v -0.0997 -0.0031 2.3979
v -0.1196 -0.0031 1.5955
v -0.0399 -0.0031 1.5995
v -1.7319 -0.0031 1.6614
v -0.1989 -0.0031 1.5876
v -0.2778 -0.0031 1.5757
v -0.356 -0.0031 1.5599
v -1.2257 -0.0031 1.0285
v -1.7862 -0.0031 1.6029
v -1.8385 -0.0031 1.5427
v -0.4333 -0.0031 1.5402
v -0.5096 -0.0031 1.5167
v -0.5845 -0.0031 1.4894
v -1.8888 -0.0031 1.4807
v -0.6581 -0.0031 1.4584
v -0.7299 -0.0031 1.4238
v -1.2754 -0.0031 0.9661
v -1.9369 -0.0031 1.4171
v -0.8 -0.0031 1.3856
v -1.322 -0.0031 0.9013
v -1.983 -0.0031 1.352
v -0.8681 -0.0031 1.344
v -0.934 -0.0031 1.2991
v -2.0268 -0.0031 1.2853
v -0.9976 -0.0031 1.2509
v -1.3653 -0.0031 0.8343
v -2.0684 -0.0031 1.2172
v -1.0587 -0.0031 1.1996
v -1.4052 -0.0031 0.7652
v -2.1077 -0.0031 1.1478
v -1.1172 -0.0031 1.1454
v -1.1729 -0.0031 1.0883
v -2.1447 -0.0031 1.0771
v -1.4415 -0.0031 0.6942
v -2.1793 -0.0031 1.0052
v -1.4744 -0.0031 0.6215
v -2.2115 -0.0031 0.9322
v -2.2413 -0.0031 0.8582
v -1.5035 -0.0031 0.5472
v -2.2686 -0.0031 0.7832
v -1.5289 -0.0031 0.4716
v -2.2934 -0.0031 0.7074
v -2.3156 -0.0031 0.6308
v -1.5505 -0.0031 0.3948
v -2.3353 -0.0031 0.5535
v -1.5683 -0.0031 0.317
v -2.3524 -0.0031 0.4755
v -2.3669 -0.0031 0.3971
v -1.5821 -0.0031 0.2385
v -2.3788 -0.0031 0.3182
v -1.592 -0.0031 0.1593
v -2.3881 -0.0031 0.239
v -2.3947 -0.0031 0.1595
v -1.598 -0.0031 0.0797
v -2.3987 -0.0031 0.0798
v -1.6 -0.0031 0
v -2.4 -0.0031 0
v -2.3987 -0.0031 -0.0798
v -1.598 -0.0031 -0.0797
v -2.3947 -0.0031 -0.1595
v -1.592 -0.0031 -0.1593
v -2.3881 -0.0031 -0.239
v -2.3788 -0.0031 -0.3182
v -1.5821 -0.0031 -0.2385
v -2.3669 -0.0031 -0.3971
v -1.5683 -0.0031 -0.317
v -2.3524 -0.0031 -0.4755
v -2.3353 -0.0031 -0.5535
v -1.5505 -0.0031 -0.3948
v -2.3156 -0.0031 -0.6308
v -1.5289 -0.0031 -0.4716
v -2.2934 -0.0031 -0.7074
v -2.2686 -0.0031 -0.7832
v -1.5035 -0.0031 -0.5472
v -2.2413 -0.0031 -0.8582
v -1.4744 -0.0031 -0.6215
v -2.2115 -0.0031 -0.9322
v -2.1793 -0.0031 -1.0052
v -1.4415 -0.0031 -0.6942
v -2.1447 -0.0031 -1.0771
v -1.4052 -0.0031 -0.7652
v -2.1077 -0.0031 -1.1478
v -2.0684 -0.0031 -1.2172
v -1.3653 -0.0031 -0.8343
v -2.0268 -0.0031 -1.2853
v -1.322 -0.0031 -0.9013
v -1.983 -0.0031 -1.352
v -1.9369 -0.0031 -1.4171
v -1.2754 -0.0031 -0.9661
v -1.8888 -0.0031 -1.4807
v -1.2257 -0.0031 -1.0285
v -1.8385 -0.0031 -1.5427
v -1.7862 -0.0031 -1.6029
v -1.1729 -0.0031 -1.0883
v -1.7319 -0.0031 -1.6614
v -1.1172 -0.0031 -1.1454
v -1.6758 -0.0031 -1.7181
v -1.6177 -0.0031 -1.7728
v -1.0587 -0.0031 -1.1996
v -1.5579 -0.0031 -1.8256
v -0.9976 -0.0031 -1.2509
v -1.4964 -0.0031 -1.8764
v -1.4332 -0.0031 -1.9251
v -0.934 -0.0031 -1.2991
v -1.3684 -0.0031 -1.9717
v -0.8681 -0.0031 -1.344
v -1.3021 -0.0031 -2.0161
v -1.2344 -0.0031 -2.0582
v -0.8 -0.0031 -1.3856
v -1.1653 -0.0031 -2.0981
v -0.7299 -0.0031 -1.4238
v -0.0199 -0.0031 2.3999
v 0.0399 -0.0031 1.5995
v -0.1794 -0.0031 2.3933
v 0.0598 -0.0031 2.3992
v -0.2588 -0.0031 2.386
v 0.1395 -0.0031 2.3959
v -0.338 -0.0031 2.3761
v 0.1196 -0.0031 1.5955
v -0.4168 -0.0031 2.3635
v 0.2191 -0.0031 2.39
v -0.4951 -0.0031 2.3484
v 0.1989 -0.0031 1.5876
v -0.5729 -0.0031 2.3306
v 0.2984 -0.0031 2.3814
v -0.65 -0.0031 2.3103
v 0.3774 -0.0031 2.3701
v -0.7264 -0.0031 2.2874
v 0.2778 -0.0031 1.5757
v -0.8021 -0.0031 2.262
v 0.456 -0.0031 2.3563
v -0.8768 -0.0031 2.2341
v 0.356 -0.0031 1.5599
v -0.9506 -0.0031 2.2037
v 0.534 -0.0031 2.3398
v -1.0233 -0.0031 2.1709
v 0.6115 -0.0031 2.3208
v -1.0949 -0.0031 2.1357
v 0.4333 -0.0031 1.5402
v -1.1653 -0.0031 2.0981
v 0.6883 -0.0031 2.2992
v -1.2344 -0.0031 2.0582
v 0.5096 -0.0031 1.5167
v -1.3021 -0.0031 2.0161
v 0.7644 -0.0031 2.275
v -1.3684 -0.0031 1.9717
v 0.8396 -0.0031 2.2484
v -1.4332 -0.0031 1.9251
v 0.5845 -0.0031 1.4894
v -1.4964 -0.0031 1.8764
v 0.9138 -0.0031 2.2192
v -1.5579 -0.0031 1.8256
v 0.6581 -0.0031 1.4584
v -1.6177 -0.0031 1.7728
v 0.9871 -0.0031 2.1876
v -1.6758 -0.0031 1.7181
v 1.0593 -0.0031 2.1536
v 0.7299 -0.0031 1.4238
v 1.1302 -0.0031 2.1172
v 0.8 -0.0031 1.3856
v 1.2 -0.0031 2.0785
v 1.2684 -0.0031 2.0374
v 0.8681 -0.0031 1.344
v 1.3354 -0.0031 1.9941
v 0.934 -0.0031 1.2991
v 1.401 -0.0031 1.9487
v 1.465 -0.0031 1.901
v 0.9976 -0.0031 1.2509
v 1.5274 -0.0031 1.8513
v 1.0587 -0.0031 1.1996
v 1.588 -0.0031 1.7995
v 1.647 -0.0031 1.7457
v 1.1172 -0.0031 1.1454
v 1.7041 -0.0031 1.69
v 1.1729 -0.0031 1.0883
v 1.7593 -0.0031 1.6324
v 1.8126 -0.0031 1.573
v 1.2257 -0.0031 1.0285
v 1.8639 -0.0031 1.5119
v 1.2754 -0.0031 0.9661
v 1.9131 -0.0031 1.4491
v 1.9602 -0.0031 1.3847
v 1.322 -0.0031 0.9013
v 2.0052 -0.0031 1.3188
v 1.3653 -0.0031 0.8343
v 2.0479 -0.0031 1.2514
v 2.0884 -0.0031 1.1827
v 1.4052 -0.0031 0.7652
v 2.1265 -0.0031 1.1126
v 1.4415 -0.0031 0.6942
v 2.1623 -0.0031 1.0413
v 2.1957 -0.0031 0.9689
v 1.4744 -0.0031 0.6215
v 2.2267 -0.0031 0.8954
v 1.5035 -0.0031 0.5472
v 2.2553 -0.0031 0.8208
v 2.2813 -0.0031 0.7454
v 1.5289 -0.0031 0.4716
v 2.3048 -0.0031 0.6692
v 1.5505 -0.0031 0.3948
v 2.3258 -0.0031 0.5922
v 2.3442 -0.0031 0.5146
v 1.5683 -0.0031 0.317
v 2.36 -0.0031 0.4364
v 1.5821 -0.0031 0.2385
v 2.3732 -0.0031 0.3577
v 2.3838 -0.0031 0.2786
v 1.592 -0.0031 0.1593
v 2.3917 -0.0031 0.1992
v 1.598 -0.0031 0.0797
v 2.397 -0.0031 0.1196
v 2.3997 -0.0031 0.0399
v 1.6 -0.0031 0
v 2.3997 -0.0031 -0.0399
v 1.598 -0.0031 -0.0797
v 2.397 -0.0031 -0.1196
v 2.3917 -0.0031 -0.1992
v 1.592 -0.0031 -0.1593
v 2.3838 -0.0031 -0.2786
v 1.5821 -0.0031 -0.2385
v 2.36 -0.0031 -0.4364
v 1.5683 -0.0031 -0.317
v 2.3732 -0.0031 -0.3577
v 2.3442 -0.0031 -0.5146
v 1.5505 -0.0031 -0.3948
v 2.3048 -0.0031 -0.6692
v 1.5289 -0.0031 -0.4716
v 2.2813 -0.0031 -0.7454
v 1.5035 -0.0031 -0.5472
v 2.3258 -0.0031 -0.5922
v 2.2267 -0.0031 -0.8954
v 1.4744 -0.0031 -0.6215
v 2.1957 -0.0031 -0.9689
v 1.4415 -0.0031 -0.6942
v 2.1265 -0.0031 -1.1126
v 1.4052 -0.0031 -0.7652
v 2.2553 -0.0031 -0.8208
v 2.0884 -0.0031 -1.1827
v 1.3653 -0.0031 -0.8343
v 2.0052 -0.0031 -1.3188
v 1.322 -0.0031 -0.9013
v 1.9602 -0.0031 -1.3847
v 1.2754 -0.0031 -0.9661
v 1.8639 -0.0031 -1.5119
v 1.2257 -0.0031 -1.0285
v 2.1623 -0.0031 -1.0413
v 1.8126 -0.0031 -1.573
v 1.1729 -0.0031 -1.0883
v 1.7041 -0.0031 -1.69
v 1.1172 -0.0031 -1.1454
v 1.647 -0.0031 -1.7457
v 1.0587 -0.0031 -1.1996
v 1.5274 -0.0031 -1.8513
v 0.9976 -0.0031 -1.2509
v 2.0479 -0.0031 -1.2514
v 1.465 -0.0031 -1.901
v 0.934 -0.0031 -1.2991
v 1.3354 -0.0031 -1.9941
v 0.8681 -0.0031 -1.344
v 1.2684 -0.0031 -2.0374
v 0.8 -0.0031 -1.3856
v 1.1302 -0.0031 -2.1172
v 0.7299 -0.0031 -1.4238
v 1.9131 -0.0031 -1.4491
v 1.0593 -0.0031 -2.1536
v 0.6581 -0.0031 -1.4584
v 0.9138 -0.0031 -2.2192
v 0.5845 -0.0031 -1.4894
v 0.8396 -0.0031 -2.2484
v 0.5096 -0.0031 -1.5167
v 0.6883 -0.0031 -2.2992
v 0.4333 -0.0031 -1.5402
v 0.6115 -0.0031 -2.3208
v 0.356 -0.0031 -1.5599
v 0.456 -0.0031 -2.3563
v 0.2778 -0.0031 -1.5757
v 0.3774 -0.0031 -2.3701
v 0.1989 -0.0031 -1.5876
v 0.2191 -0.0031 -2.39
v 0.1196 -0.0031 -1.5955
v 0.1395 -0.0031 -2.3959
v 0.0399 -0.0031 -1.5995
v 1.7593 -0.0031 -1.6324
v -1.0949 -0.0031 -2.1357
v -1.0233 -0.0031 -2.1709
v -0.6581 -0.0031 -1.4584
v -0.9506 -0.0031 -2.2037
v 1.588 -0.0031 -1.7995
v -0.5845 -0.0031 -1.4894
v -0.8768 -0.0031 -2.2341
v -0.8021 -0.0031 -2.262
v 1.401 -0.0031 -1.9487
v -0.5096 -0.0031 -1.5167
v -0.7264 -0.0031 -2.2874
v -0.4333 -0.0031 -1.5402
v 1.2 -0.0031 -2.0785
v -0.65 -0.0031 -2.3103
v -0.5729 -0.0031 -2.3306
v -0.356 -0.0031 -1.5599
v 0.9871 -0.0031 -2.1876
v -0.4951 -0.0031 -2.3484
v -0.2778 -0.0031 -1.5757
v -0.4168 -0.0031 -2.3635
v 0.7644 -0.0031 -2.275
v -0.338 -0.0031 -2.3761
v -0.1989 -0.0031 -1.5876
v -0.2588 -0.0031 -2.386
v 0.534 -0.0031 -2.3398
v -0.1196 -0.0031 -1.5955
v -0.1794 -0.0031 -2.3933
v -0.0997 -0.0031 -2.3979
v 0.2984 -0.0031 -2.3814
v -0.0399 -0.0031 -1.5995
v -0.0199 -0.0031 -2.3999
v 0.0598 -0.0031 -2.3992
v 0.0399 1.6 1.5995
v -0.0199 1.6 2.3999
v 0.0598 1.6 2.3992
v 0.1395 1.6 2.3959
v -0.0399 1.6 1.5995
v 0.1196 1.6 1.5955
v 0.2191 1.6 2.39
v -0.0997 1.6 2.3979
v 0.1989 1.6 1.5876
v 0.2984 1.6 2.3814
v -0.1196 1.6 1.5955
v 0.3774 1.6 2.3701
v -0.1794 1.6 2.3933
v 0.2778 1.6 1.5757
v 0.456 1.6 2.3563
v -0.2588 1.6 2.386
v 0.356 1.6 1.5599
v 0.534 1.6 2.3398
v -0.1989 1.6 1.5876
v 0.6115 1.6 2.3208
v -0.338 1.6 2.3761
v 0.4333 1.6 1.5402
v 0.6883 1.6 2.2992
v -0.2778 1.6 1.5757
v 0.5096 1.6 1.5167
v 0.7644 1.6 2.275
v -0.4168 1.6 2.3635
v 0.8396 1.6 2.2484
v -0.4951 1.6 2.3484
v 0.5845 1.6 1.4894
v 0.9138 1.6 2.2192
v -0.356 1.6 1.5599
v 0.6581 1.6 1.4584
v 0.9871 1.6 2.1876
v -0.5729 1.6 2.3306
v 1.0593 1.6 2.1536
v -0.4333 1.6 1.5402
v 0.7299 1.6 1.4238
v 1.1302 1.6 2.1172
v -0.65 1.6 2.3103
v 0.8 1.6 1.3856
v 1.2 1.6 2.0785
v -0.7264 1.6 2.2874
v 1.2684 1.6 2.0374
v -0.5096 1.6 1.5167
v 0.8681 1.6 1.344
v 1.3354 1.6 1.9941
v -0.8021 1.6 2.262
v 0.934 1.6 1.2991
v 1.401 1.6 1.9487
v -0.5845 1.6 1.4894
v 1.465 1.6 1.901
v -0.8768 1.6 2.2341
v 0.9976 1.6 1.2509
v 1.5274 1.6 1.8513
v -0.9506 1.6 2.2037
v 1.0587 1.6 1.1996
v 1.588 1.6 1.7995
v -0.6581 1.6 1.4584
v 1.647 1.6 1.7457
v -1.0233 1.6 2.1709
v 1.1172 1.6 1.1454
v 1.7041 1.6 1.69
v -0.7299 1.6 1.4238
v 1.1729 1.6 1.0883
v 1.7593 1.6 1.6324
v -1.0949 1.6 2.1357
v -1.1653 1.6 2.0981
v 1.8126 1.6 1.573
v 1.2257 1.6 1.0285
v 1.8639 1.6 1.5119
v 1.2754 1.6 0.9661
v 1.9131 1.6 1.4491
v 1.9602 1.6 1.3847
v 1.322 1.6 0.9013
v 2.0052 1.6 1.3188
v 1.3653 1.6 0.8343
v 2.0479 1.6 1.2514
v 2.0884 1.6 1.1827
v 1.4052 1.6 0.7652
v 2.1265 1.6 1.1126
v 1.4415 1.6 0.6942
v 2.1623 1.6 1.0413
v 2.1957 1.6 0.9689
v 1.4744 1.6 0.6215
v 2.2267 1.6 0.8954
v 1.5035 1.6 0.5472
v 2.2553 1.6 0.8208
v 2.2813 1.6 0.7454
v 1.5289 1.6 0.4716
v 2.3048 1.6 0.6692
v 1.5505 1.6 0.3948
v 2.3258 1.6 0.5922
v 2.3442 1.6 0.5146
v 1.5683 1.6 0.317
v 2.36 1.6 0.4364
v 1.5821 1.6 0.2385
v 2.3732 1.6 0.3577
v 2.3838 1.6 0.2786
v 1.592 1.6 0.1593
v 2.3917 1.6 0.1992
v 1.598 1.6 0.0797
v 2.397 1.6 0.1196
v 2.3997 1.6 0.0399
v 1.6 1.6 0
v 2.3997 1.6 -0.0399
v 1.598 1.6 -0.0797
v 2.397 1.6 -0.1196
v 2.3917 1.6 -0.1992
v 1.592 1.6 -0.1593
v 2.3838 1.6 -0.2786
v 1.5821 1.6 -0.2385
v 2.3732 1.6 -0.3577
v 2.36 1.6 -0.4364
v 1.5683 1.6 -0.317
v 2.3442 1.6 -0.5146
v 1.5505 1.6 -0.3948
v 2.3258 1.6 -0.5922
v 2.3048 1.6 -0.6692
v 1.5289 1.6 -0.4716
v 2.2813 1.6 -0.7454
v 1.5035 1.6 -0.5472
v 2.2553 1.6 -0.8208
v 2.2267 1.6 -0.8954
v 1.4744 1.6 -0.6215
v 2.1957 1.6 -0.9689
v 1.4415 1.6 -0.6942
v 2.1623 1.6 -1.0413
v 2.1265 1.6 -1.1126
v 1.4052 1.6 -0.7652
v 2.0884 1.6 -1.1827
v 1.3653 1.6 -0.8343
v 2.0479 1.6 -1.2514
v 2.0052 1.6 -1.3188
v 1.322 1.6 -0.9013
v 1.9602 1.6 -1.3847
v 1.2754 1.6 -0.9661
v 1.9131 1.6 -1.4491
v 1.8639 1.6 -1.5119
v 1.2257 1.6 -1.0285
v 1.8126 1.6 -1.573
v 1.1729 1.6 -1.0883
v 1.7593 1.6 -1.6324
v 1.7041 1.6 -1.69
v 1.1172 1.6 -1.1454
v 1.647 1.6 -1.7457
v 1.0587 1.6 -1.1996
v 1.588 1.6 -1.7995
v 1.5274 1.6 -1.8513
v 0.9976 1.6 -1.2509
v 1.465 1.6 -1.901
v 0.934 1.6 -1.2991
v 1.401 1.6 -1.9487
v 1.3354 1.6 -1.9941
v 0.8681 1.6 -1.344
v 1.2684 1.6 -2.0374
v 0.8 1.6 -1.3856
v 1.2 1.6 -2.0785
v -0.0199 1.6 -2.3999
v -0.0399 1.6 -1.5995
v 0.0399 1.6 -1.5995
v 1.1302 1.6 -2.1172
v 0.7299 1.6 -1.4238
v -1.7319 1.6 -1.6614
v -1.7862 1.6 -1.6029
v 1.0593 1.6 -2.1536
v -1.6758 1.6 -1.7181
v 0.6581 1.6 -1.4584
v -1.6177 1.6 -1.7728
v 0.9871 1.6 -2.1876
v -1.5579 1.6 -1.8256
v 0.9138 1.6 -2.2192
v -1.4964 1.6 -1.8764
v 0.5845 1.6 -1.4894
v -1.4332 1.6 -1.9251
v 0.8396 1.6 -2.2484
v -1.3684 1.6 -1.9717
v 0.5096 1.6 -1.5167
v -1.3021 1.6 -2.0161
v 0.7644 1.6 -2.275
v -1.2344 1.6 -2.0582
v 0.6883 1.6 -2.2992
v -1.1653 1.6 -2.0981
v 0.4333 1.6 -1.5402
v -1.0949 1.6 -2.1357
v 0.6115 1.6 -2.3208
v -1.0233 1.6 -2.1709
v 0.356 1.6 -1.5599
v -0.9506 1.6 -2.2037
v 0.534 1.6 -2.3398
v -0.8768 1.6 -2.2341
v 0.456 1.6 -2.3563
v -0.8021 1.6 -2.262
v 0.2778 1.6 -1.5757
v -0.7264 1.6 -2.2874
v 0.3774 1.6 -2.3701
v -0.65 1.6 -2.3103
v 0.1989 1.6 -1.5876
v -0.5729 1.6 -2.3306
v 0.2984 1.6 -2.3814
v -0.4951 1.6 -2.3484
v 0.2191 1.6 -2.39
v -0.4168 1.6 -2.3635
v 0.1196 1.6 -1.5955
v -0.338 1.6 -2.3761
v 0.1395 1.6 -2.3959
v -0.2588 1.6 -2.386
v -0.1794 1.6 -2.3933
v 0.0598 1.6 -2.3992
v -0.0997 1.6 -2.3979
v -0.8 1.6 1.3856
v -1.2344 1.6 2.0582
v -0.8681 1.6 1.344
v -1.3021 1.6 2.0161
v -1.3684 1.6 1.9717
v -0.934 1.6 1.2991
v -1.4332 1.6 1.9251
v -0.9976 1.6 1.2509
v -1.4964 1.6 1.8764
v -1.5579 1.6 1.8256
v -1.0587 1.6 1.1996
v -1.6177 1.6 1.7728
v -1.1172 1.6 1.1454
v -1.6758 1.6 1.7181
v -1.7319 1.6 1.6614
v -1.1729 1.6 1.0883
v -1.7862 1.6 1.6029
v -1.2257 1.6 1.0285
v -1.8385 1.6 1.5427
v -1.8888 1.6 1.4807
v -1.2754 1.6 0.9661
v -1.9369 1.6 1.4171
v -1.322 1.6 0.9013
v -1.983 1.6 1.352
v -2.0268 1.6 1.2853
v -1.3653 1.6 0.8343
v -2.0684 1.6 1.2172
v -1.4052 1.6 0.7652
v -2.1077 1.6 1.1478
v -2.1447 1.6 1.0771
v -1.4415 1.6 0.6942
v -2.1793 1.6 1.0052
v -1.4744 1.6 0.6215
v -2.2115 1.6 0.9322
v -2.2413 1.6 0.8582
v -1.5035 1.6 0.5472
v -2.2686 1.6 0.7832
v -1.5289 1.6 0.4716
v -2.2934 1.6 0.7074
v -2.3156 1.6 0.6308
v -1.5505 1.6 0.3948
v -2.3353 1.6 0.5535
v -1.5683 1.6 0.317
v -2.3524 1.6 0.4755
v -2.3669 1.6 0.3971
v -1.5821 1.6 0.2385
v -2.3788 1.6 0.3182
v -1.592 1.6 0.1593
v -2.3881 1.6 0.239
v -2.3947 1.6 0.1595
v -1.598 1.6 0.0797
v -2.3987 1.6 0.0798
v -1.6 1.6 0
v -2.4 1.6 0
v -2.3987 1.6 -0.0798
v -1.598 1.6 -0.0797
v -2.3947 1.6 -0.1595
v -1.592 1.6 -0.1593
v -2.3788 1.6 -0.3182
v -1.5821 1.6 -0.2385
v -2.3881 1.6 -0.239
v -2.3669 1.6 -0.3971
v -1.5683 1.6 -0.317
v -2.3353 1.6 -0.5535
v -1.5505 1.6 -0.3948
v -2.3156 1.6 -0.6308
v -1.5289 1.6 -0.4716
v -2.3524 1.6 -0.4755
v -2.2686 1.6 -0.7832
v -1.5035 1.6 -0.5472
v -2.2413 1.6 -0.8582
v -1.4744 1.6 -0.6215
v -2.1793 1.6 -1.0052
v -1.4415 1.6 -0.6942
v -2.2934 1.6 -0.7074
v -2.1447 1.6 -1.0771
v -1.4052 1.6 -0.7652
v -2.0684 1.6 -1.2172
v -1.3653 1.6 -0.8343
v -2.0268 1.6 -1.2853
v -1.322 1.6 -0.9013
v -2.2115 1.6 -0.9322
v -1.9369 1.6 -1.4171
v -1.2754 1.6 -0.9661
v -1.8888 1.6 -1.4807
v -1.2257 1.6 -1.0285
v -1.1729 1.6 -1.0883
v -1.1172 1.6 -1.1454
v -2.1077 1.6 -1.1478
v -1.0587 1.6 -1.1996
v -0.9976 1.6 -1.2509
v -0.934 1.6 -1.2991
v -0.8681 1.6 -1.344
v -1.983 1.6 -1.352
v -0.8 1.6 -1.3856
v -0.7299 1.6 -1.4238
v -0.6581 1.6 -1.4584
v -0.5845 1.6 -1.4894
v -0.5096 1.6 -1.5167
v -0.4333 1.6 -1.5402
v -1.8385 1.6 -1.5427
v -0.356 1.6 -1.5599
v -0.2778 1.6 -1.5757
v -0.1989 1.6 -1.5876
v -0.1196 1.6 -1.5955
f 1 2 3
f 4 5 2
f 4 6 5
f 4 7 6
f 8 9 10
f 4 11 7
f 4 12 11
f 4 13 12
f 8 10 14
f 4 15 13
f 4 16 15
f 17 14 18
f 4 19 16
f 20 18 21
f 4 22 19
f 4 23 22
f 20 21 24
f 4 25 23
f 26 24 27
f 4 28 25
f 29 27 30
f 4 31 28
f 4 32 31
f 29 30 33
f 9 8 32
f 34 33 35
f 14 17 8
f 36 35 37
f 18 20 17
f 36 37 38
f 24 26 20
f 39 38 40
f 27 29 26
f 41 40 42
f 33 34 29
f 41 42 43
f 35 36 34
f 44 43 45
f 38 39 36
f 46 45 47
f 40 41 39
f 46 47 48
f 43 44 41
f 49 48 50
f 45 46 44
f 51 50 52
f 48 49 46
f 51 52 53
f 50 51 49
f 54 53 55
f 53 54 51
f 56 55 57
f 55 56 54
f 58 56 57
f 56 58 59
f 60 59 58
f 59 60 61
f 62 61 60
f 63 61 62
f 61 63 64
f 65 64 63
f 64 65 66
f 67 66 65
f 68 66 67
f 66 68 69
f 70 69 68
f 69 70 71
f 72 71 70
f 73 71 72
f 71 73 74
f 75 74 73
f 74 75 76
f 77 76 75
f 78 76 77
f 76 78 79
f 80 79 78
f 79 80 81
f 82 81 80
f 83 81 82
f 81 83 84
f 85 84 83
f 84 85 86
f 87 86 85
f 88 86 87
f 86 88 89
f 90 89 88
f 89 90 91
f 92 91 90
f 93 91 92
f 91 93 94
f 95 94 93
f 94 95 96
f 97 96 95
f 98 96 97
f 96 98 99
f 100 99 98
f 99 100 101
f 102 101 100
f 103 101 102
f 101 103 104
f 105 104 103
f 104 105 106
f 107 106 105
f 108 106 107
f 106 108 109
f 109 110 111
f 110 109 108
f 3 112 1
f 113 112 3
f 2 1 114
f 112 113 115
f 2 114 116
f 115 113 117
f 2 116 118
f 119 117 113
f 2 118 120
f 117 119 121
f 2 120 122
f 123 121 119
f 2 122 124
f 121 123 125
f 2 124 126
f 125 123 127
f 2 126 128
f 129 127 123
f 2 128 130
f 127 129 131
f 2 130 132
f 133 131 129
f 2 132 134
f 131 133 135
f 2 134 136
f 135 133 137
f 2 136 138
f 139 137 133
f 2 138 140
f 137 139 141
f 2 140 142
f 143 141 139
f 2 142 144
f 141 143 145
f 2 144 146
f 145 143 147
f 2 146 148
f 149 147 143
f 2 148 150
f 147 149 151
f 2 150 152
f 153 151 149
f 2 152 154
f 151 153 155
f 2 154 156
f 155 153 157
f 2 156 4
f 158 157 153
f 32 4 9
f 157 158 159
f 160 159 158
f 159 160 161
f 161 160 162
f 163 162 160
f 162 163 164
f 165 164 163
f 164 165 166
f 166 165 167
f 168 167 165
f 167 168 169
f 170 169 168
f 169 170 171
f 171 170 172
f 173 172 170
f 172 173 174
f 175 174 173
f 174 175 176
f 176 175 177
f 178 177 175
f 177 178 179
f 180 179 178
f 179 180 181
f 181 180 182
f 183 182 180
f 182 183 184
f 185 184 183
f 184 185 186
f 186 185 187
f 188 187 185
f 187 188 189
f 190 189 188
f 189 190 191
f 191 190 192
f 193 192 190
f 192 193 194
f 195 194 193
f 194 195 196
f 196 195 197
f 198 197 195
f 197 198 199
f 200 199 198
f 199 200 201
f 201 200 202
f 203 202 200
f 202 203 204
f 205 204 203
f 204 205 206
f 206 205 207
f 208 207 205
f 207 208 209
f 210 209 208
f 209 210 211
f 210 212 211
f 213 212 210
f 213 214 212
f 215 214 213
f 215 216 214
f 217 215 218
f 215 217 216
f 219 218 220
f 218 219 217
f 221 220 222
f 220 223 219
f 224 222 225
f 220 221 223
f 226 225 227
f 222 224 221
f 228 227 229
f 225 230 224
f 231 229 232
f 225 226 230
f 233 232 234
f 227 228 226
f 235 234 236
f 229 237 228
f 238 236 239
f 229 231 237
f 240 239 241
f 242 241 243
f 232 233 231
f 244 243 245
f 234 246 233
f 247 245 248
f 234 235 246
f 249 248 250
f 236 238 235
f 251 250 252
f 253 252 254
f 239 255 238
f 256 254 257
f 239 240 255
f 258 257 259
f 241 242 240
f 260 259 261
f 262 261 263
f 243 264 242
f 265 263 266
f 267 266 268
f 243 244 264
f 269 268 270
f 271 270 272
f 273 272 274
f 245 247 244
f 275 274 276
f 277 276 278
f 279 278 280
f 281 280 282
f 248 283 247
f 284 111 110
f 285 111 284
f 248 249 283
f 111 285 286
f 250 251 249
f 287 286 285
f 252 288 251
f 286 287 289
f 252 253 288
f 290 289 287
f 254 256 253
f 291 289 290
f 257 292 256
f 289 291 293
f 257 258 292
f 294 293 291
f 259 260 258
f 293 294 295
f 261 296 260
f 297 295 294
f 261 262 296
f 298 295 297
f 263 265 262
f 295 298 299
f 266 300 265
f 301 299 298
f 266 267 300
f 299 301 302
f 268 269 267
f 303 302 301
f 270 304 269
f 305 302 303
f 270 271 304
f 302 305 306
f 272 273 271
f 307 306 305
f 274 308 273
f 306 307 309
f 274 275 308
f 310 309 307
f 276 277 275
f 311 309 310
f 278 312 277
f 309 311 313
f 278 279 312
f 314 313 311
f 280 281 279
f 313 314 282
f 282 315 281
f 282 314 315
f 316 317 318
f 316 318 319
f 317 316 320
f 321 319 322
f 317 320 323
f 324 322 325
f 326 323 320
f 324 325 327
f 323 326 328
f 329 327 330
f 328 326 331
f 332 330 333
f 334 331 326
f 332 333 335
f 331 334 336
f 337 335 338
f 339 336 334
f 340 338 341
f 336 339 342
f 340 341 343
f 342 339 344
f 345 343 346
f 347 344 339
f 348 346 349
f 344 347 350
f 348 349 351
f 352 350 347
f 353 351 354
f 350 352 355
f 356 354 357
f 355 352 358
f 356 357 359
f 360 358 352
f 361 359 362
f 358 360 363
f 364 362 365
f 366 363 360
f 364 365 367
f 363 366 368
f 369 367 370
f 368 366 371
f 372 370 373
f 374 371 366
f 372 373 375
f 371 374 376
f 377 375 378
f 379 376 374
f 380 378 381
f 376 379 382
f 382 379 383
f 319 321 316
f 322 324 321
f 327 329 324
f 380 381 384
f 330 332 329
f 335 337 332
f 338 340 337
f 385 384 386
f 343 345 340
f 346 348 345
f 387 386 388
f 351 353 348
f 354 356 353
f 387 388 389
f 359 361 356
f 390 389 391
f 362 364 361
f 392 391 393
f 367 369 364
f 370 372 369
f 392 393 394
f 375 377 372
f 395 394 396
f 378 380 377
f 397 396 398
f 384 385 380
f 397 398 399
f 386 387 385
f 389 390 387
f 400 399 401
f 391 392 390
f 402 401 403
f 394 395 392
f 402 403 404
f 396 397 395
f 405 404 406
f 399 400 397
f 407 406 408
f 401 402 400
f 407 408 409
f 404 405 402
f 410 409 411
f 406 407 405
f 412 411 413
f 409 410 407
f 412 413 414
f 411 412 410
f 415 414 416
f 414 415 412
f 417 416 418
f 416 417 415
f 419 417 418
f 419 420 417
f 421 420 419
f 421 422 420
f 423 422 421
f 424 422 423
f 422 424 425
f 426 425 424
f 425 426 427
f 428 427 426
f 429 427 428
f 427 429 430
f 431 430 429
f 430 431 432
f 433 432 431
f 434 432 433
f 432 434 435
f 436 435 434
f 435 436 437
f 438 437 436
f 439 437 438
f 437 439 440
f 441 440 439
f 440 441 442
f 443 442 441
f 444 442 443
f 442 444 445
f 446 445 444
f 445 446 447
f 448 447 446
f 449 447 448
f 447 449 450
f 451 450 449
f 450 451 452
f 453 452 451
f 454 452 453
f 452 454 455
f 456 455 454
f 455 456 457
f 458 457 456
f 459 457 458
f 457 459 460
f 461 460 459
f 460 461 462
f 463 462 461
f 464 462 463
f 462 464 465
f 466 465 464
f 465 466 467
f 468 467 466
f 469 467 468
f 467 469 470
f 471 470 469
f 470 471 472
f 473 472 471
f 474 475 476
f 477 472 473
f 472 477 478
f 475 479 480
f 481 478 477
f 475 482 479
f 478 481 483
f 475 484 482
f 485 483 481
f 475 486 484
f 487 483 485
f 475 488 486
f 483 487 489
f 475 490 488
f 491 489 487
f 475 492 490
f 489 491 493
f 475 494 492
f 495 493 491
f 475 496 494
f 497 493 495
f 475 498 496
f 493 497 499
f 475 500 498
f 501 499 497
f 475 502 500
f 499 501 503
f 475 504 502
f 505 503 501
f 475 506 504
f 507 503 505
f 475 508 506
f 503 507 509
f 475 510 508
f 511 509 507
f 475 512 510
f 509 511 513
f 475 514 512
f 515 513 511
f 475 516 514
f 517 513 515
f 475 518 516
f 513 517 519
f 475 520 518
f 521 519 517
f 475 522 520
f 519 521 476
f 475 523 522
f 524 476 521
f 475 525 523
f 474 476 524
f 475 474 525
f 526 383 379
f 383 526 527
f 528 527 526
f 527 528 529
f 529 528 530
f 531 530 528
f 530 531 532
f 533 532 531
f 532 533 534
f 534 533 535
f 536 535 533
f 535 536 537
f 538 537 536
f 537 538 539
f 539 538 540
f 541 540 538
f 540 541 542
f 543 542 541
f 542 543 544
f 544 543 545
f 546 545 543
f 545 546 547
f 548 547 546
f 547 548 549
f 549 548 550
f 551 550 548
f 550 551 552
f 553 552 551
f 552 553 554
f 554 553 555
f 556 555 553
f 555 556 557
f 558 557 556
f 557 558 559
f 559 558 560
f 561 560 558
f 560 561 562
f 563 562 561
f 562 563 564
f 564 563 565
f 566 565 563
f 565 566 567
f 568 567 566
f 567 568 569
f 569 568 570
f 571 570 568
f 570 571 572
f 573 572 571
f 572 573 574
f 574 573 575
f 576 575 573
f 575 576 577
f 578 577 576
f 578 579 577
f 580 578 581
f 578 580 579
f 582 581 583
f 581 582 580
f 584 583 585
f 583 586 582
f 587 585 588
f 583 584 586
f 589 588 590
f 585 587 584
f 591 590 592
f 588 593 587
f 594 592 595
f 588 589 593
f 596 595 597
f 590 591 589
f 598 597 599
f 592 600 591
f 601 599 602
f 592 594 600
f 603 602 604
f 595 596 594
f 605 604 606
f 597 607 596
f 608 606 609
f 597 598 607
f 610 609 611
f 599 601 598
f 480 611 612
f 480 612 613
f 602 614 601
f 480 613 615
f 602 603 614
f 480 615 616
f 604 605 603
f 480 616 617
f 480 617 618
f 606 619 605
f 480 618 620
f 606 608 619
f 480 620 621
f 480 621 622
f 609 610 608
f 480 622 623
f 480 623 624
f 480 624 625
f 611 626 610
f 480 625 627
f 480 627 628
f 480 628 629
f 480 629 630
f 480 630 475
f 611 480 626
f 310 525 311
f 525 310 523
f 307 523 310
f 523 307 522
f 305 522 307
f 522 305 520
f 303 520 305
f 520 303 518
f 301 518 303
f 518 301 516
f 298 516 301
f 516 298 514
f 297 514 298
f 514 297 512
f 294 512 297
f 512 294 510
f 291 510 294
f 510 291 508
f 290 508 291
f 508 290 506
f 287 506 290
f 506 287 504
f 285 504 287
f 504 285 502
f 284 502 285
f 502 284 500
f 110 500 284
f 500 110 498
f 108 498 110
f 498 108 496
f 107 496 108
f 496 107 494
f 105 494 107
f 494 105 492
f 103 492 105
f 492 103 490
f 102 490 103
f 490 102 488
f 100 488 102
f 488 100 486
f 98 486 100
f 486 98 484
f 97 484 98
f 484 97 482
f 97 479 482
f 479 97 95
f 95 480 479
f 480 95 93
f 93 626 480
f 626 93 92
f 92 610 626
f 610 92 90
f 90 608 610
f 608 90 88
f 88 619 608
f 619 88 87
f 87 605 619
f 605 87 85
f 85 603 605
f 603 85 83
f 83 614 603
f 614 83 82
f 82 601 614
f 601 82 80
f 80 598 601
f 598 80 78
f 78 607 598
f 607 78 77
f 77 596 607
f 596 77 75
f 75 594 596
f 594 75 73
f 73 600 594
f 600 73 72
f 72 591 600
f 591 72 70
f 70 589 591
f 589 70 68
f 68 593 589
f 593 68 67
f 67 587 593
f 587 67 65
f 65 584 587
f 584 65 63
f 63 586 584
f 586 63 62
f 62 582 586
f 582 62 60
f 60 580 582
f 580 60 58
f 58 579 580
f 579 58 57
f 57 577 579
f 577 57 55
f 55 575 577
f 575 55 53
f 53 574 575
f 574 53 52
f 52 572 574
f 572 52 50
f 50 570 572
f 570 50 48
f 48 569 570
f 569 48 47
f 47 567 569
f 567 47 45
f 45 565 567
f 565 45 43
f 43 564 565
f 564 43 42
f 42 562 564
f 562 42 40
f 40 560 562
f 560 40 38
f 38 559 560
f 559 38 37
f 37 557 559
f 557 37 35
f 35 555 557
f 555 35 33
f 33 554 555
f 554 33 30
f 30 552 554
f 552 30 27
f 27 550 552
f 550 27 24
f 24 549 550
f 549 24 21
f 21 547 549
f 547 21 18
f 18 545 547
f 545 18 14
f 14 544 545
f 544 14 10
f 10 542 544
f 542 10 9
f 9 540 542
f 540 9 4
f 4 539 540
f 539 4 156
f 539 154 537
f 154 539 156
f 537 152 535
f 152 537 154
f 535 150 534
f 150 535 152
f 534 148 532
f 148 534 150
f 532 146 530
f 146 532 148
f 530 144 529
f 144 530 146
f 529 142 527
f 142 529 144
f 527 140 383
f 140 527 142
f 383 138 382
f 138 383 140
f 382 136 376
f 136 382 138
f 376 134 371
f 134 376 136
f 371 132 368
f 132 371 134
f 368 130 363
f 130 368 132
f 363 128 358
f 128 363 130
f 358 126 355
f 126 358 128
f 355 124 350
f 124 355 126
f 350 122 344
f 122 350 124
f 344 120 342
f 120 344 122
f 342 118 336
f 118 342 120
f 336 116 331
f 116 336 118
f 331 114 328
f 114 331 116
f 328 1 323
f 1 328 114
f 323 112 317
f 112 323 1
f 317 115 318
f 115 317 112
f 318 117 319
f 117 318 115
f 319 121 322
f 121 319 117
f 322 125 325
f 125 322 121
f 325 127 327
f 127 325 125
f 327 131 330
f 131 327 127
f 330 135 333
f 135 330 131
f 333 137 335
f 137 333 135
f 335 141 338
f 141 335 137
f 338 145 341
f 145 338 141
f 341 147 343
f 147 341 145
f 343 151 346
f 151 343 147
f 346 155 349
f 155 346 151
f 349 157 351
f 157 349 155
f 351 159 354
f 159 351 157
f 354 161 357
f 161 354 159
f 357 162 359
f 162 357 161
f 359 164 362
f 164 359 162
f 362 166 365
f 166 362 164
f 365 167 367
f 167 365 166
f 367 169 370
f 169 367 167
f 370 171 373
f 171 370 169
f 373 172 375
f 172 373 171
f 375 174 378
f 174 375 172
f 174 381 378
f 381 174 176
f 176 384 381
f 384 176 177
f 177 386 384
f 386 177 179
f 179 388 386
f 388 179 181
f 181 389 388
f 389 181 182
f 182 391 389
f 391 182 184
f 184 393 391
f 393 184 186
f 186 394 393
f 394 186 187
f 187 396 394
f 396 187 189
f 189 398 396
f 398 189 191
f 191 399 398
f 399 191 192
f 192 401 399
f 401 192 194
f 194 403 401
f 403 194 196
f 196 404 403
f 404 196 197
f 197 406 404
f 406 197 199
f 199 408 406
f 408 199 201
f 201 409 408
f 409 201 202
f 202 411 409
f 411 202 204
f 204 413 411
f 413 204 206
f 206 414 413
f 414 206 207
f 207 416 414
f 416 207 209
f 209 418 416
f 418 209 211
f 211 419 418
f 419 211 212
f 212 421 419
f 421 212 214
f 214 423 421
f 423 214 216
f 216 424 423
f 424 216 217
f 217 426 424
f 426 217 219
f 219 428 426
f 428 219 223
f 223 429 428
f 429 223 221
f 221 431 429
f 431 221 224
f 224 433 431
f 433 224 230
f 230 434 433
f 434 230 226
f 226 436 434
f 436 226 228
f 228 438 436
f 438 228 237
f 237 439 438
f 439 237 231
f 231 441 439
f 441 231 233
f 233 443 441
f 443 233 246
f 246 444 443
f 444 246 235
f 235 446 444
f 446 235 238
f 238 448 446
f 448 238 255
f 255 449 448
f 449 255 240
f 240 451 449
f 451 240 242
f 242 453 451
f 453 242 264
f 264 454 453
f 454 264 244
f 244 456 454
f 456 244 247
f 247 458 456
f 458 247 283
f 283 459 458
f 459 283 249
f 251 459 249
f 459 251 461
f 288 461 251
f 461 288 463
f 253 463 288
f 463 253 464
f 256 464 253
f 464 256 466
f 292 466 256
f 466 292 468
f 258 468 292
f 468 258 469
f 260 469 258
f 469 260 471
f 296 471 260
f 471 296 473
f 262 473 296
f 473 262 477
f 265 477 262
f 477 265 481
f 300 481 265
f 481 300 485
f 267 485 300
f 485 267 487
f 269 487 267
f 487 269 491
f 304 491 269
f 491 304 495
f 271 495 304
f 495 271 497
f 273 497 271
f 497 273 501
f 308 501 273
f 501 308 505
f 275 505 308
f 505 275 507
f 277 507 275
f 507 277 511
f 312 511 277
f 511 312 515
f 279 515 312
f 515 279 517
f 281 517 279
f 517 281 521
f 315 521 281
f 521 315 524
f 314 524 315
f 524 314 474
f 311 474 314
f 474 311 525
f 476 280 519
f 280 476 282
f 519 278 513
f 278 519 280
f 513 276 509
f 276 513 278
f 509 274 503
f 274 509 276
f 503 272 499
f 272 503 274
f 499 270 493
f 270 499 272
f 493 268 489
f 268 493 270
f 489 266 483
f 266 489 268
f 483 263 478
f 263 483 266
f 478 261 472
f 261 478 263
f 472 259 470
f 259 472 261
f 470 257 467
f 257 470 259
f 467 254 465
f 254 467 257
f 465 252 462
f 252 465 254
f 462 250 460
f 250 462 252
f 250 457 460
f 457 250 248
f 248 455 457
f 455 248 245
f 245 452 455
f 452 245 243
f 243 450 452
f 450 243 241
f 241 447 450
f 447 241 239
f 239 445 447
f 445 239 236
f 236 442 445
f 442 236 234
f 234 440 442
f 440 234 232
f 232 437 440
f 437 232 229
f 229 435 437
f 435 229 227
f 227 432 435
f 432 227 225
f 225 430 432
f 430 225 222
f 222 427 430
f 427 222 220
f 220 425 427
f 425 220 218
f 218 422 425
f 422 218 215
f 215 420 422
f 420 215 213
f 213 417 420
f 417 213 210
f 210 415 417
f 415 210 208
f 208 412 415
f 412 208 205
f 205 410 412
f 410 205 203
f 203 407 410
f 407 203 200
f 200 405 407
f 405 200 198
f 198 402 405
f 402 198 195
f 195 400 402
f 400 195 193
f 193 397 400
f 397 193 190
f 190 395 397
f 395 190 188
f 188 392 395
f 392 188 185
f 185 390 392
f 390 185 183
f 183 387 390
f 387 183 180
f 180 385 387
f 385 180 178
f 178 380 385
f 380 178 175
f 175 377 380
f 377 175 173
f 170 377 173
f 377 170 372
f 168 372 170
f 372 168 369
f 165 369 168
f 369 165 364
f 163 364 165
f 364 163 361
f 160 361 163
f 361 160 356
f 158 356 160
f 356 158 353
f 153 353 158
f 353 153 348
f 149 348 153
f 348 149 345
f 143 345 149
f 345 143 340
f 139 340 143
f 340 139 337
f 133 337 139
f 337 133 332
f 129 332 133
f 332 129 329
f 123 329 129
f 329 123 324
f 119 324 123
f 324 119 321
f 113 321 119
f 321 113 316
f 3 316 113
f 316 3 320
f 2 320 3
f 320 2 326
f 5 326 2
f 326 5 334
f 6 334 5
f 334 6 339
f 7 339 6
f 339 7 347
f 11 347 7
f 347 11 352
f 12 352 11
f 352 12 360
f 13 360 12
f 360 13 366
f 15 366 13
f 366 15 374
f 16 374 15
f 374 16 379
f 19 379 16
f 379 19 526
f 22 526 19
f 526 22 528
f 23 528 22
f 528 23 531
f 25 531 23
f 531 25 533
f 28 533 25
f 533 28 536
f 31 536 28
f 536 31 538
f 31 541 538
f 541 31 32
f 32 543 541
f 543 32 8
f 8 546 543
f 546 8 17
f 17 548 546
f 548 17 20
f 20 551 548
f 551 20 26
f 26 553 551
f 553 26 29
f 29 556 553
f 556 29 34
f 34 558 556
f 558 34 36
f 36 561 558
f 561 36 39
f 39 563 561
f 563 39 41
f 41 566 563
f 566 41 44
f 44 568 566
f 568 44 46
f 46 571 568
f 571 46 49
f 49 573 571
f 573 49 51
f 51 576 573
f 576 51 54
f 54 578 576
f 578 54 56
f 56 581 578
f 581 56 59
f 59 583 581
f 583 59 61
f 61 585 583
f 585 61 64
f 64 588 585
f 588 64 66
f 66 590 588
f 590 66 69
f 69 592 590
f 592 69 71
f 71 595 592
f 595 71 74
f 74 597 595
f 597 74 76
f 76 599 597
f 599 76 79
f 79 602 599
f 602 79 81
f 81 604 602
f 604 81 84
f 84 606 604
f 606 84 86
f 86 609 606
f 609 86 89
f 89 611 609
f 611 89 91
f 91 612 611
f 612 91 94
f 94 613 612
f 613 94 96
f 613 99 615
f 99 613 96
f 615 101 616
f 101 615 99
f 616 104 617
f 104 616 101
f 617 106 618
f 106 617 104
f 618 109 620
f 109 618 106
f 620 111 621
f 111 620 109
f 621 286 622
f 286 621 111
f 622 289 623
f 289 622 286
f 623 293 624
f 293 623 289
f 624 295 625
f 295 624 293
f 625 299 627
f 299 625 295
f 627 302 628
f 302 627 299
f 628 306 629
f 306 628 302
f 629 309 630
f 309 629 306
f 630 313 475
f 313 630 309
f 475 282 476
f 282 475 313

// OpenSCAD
use <../lib.scad>
use <25375k01.scad>
use <25375k02.scad>
$fa=1; $fs=0.2;
function ldraw_lib__25375_f3(realsolid=false) = [
// 0 Tassel Hanging from Side with Support Ring Vertical
// 0 Name: 25375-f3.dat
// 0 Author: Massimo Maso [Sirio]
// 0 !LDRAW_ORG Part UPDATE 2022-04
// 0 !LICENSE Licensed under CC BY 2.0 and CC BY 4.0 : see CAreadme.txt
// 
// 0 BFC CERTIFY CCW
  [0,"BFC","CERTIFY"],
  [0,"BFC","CCW"],
// 
// 0 !CATEGORY Minifig Accessory
// 0 !KEYWORDS Set 70681
// 
// 0 !HISTORY 2016-10-05 {LEGO Digital Designer} Original part shape
// 0 !HISTORY 2021-03-16 [Sirio] File preparation for LDraw Parts Tracker
// 0 !HISTORY 2022-07-18 [PTadmin] Official Update 2022-04
// 
// 
// 1 16 0 0 0 0 0 1 -1 0 0 0 -1 0 25375k01.dat
  [1,16,0,0,0,0,0,1,-1,0,0,0,-1,0, ldraw_lib__25375k01(realsolid)],
// 1 16 0 2.4726 -9.5 0 0 1 0 1 0 -1 0 0 25375k02.dat
  [1,16,0,2.4726,-9.5,0,0,1,0,1,0,-1,0,0, ldraw_lib__25375k02(realsolid)],
];
module ldraw_lib__25375_f3(step=0, col=false, unit=2/5, alt=false, line=0.2, solid=!$preview)
    makepoly(ldraw_lib__25375_f3(solid), step=step, col=col, unit=unit, alt=alt, line=line, solid=solid);
ldraw_lib__25375_f3(line=0.2);
